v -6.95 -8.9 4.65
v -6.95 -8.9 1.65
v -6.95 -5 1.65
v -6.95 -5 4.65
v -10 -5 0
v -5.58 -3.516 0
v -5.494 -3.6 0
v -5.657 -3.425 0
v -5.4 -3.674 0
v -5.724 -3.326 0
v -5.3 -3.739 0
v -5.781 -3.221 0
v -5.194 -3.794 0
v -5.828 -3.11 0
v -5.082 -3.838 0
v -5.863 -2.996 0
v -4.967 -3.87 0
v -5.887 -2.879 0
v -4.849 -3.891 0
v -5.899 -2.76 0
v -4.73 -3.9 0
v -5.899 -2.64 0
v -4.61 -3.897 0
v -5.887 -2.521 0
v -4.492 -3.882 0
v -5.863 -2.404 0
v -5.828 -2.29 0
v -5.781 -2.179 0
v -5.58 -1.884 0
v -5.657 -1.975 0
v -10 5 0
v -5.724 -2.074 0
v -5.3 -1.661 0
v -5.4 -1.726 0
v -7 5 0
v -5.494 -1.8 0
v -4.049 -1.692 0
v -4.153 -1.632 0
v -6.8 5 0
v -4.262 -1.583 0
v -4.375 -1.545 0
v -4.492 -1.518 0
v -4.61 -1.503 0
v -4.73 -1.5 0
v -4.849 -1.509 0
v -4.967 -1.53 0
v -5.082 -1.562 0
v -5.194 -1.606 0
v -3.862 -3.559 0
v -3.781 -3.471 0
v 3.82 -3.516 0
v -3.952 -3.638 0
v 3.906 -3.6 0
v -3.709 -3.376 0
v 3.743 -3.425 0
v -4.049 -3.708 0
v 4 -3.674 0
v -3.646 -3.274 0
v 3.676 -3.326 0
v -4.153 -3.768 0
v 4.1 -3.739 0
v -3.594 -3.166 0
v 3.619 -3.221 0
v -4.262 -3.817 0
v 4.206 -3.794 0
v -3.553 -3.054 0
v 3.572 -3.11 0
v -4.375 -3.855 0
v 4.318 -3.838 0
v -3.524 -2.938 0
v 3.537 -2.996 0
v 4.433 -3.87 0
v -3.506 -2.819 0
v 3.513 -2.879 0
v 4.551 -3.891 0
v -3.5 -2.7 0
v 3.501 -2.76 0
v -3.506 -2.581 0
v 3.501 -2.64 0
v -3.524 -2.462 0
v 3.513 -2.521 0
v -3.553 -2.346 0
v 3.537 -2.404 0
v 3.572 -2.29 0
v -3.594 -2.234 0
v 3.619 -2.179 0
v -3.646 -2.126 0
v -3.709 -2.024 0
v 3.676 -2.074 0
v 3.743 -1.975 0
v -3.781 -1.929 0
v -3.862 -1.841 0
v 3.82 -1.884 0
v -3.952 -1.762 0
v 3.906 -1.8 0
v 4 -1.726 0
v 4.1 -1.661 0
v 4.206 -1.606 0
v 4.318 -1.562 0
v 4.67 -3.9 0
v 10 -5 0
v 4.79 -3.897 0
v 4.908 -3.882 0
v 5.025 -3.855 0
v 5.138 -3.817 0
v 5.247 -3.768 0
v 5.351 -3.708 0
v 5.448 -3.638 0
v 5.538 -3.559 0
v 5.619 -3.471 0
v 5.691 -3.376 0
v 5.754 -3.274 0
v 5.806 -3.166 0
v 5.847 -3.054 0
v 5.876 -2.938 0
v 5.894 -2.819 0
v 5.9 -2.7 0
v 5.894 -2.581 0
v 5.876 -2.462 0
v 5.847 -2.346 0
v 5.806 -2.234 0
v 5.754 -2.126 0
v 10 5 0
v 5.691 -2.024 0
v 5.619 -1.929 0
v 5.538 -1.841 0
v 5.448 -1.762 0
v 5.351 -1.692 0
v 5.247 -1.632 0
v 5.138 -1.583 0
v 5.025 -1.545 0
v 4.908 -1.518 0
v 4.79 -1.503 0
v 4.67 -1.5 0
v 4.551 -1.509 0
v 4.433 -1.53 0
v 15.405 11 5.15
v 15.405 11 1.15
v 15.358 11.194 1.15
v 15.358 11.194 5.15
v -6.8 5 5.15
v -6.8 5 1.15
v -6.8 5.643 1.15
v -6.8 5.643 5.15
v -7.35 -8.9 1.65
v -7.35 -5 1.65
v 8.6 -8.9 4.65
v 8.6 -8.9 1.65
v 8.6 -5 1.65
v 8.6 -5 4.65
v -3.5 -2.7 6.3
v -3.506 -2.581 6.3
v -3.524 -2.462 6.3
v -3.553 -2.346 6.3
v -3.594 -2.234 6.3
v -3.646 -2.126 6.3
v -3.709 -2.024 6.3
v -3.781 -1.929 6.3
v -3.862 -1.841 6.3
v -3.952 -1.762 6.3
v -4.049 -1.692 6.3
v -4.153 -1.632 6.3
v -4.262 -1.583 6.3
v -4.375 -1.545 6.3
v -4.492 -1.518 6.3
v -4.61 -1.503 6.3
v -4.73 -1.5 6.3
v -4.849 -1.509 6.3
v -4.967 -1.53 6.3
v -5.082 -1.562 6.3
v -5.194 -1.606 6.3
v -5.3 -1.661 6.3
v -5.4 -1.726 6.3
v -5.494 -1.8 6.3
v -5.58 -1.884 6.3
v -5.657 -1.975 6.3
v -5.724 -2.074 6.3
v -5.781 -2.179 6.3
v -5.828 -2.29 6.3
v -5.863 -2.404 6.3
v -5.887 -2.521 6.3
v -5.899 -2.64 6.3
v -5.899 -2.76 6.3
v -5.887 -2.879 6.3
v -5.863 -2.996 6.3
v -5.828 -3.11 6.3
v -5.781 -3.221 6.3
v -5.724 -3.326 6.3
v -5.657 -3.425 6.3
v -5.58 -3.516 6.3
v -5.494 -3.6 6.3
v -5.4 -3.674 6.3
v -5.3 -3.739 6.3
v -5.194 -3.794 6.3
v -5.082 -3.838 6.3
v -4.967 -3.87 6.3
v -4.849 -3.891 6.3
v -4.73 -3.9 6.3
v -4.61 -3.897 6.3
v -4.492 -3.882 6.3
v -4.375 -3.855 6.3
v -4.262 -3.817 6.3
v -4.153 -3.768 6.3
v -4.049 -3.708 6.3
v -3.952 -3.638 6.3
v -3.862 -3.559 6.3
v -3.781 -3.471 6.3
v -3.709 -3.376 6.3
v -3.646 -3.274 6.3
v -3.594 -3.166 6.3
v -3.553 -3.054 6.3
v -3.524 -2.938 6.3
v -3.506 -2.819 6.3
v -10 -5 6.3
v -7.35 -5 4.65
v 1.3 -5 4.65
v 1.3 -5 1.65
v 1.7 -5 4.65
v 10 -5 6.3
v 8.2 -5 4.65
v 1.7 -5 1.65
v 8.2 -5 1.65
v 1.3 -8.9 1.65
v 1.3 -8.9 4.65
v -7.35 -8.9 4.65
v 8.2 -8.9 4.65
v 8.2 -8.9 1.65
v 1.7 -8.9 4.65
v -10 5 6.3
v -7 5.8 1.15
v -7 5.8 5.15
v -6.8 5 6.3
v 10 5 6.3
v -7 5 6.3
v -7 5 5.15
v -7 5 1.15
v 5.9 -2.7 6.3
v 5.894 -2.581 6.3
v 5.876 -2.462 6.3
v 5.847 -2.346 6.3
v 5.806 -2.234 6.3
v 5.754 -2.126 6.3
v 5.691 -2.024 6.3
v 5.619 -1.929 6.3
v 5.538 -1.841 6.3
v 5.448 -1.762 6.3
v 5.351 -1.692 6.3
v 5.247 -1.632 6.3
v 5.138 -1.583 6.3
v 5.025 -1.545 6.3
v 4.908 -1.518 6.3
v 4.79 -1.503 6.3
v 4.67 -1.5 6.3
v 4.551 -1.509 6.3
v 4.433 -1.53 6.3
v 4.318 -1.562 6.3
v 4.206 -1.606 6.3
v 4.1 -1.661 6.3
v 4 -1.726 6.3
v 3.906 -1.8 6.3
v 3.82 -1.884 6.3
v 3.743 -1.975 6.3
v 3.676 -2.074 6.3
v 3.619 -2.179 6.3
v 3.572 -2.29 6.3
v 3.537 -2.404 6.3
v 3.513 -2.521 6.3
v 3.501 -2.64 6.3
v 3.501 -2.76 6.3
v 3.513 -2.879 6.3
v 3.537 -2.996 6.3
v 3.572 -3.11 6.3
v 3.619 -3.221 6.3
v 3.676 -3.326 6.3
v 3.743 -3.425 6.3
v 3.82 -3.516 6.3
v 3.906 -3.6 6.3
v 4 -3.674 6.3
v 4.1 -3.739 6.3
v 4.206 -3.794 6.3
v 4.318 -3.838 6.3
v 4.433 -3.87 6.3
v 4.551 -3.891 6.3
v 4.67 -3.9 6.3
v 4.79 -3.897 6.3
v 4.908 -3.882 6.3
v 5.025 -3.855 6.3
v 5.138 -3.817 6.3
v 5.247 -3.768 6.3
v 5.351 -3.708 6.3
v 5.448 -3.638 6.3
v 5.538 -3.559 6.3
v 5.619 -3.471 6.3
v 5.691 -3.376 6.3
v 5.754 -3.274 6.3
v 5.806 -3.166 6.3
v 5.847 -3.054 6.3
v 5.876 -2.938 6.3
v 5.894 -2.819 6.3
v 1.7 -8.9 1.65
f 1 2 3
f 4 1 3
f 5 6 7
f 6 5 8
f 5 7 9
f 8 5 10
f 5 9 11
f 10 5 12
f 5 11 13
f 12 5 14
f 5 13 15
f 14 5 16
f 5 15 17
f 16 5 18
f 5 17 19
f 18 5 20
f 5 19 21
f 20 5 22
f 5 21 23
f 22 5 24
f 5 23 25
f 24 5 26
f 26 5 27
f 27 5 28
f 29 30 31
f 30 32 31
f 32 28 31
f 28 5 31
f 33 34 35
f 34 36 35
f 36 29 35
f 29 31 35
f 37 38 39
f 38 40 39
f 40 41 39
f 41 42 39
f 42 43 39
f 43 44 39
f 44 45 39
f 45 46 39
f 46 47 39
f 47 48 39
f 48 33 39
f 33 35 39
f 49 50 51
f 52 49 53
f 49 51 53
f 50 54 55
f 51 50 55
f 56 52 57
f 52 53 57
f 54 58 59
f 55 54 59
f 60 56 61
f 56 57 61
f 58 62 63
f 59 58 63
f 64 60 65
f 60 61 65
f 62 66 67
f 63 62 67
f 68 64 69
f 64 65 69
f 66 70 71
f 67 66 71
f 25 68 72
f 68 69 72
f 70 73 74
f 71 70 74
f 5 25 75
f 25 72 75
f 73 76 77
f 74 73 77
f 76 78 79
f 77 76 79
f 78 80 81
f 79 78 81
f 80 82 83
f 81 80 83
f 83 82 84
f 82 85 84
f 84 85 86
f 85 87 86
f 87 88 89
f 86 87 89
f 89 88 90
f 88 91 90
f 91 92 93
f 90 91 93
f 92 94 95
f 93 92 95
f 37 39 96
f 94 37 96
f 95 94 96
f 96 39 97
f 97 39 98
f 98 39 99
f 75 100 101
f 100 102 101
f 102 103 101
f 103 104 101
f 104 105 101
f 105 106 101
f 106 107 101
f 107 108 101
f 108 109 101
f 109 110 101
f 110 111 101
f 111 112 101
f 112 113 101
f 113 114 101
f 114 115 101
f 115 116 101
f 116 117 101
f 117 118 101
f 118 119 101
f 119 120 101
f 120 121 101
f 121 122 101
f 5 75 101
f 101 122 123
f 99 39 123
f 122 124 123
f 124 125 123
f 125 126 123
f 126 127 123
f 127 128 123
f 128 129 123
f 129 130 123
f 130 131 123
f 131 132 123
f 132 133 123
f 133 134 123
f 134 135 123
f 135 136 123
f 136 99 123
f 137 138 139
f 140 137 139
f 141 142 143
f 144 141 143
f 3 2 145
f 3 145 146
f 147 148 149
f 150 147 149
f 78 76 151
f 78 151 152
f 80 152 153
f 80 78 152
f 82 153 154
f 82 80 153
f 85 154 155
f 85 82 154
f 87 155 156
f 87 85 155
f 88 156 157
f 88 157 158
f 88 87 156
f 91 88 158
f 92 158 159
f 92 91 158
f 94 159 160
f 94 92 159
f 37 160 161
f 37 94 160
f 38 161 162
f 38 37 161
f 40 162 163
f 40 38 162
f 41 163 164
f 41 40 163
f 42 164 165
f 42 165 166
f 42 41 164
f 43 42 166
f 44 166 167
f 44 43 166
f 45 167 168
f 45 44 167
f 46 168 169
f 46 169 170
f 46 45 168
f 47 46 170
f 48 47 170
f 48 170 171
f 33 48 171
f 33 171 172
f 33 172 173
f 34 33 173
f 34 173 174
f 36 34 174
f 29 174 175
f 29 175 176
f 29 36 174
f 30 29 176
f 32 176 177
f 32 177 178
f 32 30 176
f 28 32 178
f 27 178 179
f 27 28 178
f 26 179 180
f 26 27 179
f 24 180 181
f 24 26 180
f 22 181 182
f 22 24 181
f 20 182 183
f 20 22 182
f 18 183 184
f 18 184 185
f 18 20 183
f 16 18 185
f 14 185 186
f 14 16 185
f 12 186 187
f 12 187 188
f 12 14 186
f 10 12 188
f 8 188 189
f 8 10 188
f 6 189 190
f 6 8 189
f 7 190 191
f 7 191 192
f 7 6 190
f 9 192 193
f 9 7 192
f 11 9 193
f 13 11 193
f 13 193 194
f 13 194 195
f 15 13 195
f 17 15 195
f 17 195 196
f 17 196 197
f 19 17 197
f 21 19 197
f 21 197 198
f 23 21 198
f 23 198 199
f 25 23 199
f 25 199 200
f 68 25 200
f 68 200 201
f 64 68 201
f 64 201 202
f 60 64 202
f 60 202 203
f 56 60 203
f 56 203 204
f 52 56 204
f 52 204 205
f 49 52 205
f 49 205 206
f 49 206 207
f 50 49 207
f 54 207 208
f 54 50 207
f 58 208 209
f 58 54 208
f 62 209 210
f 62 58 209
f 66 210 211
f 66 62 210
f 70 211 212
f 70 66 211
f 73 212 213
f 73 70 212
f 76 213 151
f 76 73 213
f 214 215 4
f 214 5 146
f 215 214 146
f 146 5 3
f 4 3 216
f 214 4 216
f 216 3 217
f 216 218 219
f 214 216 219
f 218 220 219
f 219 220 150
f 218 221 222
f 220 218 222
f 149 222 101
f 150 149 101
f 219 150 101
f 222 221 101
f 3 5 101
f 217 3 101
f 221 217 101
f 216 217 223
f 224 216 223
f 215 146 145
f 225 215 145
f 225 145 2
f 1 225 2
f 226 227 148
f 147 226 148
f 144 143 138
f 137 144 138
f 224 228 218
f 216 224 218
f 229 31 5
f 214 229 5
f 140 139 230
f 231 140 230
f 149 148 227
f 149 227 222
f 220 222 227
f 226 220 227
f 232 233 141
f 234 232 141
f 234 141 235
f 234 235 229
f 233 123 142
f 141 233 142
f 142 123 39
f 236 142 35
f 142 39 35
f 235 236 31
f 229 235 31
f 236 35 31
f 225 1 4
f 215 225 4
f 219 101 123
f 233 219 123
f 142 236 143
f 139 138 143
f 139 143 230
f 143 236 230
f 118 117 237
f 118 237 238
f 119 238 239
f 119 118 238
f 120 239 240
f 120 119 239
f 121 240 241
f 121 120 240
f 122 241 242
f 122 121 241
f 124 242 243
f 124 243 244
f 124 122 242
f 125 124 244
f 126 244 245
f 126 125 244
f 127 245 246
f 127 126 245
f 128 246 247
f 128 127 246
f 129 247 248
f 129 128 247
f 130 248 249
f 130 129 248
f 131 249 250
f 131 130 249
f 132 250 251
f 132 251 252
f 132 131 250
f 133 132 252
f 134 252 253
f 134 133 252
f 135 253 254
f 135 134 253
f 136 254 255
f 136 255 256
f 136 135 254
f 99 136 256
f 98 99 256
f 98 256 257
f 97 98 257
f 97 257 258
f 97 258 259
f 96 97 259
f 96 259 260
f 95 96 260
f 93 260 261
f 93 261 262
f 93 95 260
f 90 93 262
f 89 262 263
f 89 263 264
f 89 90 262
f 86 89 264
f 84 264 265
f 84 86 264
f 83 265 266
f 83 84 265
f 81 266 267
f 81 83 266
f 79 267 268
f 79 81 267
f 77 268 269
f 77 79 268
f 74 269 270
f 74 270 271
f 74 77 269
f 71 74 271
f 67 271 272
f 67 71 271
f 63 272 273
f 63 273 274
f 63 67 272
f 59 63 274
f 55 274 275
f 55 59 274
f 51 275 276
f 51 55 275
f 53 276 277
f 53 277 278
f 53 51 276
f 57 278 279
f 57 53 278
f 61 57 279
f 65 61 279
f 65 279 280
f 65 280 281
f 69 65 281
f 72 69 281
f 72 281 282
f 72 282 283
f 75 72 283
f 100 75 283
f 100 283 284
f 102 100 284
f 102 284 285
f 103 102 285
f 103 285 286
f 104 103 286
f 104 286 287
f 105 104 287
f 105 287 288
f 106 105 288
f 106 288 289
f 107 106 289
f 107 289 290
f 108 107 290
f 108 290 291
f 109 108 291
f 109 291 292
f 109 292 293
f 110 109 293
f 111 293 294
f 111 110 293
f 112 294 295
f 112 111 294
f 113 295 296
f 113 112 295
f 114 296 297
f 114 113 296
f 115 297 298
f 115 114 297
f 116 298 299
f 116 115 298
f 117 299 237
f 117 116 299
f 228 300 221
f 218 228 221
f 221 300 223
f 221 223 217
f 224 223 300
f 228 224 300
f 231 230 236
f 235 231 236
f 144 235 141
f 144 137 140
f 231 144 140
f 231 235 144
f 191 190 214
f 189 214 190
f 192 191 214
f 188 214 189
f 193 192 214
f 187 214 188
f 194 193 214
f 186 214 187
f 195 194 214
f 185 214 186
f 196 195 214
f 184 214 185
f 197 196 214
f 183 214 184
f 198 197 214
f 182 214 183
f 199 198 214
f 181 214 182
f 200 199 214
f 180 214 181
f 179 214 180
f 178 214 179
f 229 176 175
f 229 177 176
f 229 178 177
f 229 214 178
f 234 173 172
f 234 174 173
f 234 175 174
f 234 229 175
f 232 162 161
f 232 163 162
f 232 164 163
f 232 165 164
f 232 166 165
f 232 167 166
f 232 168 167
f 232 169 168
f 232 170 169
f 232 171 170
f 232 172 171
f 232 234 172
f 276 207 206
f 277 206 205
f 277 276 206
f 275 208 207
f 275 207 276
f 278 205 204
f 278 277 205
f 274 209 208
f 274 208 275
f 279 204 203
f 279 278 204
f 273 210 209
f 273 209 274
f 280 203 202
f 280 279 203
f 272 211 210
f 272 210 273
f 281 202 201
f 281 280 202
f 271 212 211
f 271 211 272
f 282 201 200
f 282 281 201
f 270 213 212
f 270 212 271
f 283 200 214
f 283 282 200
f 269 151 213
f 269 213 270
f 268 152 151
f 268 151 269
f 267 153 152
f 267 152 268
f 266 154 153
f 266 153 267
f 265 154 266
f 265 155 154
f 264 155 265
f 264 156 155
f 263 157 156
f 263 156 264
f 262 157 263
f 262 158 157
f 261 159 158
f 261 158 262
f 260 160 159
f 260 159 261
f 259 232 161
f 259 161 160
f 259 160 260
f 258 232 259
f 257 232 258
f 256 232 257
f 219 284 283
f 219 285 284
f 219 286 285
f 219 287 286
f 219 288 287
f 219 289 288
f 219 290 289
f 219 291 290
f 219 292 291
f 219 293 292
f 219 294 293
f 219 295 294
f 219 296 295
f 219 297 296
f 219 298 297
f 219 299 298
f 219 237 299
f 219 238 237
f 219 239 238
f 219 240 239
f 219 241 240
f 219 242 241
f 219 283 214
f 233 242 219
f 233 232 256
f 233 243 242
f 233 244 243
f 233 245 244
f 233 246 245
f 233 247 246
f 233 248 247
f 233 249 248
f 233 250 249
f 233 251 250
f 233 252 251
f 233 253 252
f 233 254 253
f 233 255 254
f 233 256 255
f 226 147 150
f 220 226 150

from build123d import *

# Parameters (mm, degrees)
ESBO_O1_R                = 1.2
RESSALTO_EXTRUS_O1_DEPTH = 6.3
ESBO_O2_W                = 1.65
ESBO_O2_H                = 3.9
CORTE_EXTRUS_O1_DEPTH    = 21
ESBO_O3_W                = 1.15
ESBO_O3_H                = 6.194421291
CORTE_EXTRUS_O2_DEPTH    = 23.405356502


with BuildPart() as part:
    # Esboço1 → Ressalto-extrusão1 (new body)
    with BuildSketch(Plane.XY):
        Polygon((1.7, -5), (8.2, -5), (8.2, -8.9), (8.6, -8.9), (8.6, -5), (10, -5), (10, 5), (-6.8, 5), (-6.8, 5.642515202), (15.405356502, 11), (15.358448491, 11.194421291), (-7, 5.8), (-7, 5), (-10, 5), (-10, -5), (-7.35, -5), (-7.35, -8.9), (-6.95, -8.9), (-6.95, -5), (1.3, -5), (1.3, -8.9), (1.7, -8.9), align=None)
        with Locations((-4.7, -2.7)):
            Circle(ESBO_O1_R, mode=Mode.SUBTRACT)
        with Locations((4.7, -2.7)):
            Circle(ESBO_O1_R, mode=Mode.SUBTRACT)
    extrude(amount=RESSALTO_EXTRUS_O1_DEPTH)

    # Esboço2 → Corte-extrusão1 (cut, through all)
    with BuildSketch(Plane(origin=(10, 0, 0), x_dir=(0, 0, -1), z_dir=(1, 0, 0))):
        with Locations((-0.825, -6.95)):
            Rectangle(ESBO_O2_W, ESBO_O2_H)
        with Locations((-5.475, -6.95)):
            Rectangle(ESBO_O2_W, ESBO_O2_H)
    extrude(amount=-CORTE_EXTRUS_O1_DEPTH, mode=Mode.SUBTRACT)

    # Esboço3 → Corte-extrusão2 (cut, through all)
    with BuildSketch(Plane.ZY.offset(7)):
        with Locations((0.575, 8.097210646)):
            Rectangle(ESBO_O3_W, ESBO_O3_H)
        with Locations((5.725, 8.097210646)):
            Rectangle(ESBO_O3_W, ESBO_O3_H)
    extrude(amount=-CORTE_EXTRUS_O2_DEPTH, mode=Mode.SUBTRACT)


solid = part.part
